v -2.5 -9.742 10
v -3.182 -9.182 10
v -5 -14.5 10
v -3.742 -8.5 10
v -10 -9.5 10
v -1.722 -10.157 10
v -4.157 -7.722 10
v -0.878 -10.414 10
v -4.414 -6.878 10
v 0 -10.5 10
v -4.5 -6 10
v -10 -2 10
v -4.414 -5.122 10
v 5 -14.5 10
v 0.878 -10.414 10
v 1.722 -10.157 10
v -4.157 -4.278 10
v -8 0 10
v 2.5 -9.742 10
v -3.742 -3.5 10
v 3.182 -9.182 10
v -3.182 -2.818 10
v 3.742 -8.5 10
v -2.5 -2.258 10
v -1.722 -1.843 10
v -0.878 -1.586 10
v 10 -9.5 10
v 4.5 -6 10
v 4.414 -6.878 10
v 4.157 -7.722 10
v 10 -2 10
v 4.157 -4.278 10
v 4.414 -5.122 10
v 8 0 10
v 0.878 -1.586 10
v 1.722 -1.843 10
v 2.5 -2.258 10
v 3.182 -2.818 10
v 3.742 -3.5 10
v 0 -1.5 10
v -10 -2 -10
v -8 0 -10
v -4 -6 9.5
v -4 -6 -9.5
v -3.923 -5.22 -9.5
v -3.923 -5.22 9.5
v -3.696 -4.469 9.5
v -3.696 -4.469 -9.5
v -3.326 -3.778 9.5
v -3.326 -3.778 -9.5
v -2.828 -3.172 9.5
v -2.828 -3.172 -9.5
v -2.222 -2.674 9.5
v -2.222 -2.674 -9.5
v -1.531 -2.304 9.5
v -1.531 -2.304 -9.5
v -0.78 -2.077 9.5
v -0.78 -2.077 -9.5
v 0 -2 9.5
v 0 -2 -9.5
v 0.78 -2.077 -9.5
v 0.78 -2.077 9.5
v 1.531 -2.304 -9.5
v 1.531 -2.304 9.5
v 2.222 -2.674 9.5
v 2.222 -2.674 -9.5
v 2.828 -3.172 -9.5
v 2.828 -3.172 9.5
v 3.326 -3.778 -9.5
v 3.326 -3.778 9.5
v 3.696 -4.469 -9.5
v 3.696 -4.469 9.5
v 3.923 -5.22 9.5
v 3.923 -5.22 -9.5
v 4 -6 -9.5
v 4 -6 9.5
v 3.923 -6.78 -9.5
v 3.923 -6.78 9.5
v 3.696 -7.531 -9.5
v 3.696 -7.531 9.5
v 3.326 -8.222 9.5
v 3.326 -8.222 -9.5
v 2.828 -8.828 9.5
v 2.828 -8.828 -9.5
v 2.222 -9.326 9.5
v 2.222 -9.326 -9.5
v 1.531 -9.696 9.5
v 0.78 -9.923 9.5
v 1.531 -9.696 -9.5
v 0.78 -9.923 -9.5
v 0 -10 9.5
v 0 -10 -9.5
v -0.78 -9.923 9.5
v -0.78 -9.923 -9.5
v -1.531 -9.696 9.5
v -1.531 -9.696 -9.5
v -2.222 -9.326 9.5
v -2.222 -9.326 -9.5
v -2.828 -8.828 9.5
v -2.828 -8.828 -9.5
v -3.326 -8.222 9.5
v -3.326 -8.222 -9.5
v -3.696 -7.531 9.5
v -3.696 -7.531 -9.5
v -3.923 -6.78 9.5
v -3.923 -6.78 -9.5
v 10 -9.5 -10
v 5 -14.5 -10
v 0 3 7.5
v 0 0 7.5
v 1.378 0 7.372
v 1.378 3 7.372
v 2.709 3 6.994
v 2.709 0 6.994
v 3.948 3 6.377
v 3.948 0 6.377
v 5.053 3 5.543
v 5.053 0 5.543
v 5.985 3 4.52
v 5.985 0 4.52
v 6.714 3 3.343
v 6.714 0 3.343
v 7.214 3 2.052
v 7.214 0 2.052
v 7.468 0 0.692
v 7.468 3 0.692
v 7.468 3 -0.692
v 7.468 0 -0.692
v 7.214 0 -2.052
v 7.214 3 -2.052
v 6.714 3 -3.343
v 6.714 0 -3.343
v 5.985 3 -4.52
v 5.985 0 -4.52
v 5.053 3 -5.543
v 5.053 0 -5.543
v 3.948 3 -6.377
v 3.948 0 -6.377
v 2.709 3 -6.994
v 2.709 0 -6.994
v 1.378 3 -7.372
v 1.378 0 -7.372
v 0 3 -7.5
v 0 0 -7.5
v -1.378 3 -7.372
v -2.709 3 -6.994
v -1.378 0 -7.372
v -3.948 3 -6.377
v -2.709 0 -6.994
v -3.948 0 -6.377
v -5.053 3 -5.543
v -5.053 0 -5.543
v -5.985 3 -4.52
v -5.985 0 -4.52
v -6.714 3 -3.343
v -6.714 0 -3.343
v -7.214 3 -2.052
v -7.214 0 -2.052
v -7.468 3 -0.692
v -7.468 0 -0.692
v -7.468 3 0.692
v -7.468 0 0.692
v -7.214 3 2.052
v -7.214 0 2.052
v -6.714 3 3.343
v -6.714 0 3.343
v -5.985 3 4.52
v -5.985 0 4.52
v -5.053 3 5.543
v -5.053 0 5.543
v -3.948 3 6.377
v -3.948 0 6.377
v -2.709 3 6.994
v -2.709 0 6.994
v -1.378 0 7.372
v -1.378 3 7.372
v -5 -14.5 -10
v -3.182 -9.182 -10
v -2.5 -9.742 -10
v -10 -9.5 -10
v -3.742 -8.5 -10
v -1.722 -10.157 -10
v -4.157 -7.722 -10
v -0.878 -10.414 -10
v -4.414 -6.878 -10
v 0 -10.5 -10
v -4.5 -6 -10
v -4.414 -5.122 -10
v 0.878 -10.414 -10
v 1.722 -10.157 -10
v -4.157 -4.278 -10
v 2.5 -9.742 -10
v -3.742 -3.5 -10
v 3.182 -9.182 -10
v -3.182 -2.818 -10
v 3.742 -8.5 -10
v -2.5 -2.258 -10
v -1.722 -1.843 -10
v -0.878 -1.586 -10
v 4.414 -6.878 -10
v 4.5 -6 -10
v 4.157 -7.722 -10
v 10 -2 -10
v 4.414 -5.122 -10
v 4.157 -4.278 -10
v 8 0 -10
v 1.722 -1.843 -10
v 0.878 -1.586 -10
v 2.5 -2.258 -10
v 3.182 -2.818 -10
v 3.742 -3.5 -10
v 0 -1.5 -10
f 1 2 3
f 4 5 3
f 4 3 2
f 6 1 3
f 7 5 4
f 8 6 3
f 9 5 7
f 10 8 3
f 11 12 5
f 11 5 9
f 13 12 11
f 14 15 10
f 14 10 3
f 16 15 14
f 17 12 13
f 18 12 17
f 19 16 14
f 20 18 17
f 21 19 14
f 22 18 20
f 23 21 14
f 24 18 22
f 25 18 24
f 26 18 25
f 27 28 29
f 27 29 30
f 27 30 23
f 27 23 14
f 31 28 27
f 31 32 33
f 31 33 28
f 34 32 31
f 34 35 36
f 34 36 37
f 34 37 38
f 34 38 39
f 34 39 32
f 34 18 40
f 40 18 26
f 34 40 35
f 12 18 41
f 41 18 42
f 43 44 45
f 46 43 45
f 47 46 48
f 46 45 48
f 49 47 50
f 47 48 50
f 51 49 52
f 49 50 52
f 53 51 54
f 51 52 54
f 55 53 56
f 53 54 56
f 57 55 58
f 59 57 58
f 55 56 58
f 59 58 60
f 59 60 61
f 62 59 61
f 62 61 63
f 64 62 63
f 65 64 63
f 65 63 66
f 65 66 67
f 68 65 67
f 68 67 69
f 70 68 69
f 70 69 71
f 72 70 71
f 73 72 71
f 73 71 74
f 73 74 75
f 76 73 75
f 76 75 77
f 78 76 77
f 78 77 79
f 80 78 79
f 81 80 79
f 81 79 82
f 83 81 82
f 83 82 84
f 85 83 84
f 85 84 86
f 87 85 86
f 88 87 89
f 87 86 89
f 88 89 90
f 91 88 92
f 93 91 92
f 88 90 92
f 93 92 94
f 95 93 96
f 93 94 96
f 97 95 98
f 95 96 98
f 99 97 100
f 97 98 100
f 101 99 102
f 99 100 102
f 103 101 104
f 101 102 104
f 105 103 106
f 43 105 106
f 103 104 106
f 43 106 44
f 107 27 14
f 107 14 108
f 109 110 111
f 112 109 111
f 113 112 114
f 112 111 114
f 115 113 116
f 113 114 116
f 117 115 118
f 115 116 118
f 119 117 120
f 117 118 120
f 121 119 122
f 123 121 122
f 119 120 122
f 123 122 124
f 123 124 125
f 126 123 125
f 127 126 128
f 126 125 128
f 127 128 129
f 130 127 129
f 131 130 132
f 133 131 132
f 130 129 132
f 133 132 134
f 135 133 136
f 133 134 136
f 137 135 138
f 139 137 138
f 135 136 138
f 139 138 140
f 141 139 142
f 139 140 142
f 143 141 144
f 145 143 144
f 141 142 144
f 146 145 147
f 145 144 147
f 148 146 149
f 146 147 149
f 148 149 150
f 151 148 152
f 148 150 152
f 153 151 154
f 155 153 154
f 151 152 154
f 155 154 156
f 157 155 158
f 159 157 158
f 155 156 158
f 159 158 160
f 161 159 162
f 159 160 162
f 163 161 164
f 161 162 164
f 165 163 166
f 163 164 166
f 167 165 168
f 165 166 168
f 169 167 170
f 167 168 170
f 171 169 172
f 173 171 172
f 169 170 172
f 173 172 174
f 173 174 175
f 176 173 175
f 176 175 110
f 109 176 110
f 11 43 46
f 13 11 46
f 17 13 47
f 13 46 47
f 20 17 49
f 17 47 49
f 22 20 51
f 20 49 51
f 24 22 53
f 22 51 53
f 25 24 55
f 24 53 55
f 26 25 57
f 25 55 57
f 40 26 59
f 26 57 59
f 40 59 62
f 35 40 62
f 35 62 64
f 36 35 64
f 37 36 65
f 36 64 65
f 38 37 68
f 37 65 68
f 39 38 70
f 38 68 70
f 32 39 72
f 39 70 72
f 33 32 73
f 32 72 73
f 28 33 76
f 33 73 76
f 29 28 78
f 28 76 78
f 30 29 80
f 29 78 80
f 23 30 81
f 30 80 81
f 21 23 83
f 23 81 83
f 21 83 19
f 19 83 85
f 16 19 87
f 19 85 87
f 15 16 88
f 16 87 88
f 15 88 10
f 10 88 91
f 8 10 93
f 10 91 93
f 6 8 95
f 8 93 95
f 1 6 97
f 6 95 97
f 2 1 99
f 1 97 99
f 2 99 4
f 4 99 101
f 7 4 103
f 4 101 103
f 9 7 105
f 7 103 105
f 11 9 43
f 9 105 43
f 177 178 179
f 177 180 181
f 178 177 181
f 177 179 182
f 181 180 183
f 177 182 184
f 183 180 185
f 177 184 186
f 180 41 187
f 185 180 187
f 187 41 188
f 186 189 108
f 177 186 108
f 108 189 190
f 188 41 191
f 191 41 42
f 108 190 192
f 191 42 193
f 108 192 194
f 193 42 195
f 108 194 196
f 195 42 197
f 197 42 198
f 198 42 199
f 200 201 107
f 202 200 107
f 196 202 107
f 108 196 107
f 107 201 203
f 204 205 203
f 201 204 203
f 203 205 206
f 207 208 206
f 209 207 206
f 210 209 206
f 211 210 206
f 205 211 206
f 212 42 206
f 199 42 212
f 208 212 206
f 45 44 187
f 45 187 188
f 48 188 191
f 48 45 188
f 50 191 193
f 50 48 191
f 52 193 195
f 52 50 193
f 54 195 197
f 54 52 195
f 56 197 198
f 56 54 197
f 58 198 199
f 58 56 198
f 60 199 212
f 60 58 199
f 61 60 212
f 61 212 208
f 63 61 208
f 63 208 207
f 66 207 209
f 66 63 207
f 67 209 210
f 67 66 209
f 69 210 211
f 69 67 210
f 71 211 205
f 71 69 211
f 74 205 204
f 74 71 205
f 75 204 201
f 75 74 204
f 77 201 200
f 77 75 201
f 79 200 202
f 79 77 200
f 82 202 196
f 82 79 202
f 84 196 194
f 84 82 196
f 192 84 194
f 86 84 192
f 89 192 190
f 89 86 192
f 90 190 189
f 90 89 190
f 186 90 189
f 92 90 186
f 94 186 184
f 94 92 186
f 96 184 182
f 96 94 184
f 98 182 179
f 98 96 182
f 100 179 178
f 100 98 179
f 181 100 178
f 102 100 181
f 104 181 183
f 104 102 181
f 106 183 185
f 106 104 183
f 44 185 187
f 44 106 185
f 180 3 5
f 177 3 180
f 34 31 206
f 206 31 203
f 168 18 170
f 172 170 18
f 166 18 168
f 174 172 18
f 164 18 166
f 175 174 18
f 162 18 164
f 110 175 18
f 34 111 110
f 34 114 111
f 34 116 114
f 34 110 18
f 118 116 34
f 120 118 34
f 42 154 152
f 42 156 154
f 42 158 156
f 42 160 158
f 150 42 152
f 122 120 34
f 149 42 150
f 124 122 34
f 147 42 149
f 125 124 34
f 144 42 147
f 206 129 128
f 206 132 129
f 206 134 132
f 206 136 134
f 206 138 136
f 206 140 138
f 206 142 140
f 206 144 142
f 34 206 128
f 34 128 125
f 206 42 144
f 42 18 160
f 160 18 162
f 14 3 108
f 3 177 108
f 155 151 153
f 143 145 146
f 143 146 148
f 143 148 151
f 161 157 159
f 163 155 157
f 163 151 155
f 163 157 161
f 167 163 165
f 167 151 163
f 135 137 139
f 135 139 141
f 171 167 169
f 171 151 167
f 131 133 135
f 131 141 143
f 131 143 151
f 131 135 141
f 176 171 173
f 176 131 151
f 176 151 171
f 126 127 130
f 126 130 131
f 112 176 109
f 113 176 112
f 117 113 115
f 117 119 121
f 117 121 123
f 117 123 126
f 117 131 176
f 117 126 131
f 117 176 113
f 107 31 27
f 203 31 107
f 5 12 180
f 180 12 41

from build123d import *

# Parameters (mm, degrees)
SKETCH1_W                = 20
SKETCH1_H                = 20
BOSS_EXTRUDE1_DEPTH      = 14.5
SKETCH2_R                = 7.5
BOSS_EXTRUDE2_DEPTH      = 3
F_8_0_8_DIAMETER_HOLE1_D = 8
CHAMFER1_SIZE            = 5
CHAMFER2_SIZE            = 2
CHAMFER3_SIZE            = 0.5


with BuildPart() as part:
    # Sketch1 → Boss-Extrude1 (new body)
    with BuildSketch(Plane(origin=(0, 0, 0), x_dir=(1, 0, 0), z_dir=(0, 1, 0))):
        Rectangle(SKETCH1_W, SKETCH1_H)
    extrude(amount=-BOSS_EXTRUDE1_DEPTH)

    # Sketch2 → Boss-Extrude2 (add)
    with BuildSketch(Plane(origin=(0, 0, 0), x_dir=(-1, 0, 0), z_dir=(0, 1, 0))):
        with Locations(Location((0, 0, 0), (0, 0, 90))):
            Circle(SKETCH2_R)
    extrude(amount=BOSS_EXTRUDE2_DEPTH)

    # Ø8.0 (8) Diameter Hole1 (through all)
    with Locations(Plane.XY.offset(10)):
        with Locations((0, -6)):
            Hole(F_8_0_8_DIAMETER_HOLE1_D / 2)

    # Chamfer1
    chamfer1_edges = [part.edges().sort_by_distance(p)[0] for p in [
        (-10, -14.5, 0),
        (10, -14.5, 0),
    ]]
    chamfer(chamfer1_edges, length=CHAMFER1_SIZE)

    # Chamfer2
    chamfer2_edges = [part.edges().sort_by_distance(p)[0] for p in [
        (-10, 0, 0),
        (10, 0, 0),
    ]]
    chamfer(chamfer2_edges, length=CHAMFER2_SIZE)

    # Chamfer3
    chamfer3_edges = [part.edges().sort_by_distance(p)[0] for p in [
        (4, -6, 10),
        (4, -6, -10),
    ]]
    chamfer(chamfer3_edges, length=CHAMFER3_SIZE)


solid = part.part
